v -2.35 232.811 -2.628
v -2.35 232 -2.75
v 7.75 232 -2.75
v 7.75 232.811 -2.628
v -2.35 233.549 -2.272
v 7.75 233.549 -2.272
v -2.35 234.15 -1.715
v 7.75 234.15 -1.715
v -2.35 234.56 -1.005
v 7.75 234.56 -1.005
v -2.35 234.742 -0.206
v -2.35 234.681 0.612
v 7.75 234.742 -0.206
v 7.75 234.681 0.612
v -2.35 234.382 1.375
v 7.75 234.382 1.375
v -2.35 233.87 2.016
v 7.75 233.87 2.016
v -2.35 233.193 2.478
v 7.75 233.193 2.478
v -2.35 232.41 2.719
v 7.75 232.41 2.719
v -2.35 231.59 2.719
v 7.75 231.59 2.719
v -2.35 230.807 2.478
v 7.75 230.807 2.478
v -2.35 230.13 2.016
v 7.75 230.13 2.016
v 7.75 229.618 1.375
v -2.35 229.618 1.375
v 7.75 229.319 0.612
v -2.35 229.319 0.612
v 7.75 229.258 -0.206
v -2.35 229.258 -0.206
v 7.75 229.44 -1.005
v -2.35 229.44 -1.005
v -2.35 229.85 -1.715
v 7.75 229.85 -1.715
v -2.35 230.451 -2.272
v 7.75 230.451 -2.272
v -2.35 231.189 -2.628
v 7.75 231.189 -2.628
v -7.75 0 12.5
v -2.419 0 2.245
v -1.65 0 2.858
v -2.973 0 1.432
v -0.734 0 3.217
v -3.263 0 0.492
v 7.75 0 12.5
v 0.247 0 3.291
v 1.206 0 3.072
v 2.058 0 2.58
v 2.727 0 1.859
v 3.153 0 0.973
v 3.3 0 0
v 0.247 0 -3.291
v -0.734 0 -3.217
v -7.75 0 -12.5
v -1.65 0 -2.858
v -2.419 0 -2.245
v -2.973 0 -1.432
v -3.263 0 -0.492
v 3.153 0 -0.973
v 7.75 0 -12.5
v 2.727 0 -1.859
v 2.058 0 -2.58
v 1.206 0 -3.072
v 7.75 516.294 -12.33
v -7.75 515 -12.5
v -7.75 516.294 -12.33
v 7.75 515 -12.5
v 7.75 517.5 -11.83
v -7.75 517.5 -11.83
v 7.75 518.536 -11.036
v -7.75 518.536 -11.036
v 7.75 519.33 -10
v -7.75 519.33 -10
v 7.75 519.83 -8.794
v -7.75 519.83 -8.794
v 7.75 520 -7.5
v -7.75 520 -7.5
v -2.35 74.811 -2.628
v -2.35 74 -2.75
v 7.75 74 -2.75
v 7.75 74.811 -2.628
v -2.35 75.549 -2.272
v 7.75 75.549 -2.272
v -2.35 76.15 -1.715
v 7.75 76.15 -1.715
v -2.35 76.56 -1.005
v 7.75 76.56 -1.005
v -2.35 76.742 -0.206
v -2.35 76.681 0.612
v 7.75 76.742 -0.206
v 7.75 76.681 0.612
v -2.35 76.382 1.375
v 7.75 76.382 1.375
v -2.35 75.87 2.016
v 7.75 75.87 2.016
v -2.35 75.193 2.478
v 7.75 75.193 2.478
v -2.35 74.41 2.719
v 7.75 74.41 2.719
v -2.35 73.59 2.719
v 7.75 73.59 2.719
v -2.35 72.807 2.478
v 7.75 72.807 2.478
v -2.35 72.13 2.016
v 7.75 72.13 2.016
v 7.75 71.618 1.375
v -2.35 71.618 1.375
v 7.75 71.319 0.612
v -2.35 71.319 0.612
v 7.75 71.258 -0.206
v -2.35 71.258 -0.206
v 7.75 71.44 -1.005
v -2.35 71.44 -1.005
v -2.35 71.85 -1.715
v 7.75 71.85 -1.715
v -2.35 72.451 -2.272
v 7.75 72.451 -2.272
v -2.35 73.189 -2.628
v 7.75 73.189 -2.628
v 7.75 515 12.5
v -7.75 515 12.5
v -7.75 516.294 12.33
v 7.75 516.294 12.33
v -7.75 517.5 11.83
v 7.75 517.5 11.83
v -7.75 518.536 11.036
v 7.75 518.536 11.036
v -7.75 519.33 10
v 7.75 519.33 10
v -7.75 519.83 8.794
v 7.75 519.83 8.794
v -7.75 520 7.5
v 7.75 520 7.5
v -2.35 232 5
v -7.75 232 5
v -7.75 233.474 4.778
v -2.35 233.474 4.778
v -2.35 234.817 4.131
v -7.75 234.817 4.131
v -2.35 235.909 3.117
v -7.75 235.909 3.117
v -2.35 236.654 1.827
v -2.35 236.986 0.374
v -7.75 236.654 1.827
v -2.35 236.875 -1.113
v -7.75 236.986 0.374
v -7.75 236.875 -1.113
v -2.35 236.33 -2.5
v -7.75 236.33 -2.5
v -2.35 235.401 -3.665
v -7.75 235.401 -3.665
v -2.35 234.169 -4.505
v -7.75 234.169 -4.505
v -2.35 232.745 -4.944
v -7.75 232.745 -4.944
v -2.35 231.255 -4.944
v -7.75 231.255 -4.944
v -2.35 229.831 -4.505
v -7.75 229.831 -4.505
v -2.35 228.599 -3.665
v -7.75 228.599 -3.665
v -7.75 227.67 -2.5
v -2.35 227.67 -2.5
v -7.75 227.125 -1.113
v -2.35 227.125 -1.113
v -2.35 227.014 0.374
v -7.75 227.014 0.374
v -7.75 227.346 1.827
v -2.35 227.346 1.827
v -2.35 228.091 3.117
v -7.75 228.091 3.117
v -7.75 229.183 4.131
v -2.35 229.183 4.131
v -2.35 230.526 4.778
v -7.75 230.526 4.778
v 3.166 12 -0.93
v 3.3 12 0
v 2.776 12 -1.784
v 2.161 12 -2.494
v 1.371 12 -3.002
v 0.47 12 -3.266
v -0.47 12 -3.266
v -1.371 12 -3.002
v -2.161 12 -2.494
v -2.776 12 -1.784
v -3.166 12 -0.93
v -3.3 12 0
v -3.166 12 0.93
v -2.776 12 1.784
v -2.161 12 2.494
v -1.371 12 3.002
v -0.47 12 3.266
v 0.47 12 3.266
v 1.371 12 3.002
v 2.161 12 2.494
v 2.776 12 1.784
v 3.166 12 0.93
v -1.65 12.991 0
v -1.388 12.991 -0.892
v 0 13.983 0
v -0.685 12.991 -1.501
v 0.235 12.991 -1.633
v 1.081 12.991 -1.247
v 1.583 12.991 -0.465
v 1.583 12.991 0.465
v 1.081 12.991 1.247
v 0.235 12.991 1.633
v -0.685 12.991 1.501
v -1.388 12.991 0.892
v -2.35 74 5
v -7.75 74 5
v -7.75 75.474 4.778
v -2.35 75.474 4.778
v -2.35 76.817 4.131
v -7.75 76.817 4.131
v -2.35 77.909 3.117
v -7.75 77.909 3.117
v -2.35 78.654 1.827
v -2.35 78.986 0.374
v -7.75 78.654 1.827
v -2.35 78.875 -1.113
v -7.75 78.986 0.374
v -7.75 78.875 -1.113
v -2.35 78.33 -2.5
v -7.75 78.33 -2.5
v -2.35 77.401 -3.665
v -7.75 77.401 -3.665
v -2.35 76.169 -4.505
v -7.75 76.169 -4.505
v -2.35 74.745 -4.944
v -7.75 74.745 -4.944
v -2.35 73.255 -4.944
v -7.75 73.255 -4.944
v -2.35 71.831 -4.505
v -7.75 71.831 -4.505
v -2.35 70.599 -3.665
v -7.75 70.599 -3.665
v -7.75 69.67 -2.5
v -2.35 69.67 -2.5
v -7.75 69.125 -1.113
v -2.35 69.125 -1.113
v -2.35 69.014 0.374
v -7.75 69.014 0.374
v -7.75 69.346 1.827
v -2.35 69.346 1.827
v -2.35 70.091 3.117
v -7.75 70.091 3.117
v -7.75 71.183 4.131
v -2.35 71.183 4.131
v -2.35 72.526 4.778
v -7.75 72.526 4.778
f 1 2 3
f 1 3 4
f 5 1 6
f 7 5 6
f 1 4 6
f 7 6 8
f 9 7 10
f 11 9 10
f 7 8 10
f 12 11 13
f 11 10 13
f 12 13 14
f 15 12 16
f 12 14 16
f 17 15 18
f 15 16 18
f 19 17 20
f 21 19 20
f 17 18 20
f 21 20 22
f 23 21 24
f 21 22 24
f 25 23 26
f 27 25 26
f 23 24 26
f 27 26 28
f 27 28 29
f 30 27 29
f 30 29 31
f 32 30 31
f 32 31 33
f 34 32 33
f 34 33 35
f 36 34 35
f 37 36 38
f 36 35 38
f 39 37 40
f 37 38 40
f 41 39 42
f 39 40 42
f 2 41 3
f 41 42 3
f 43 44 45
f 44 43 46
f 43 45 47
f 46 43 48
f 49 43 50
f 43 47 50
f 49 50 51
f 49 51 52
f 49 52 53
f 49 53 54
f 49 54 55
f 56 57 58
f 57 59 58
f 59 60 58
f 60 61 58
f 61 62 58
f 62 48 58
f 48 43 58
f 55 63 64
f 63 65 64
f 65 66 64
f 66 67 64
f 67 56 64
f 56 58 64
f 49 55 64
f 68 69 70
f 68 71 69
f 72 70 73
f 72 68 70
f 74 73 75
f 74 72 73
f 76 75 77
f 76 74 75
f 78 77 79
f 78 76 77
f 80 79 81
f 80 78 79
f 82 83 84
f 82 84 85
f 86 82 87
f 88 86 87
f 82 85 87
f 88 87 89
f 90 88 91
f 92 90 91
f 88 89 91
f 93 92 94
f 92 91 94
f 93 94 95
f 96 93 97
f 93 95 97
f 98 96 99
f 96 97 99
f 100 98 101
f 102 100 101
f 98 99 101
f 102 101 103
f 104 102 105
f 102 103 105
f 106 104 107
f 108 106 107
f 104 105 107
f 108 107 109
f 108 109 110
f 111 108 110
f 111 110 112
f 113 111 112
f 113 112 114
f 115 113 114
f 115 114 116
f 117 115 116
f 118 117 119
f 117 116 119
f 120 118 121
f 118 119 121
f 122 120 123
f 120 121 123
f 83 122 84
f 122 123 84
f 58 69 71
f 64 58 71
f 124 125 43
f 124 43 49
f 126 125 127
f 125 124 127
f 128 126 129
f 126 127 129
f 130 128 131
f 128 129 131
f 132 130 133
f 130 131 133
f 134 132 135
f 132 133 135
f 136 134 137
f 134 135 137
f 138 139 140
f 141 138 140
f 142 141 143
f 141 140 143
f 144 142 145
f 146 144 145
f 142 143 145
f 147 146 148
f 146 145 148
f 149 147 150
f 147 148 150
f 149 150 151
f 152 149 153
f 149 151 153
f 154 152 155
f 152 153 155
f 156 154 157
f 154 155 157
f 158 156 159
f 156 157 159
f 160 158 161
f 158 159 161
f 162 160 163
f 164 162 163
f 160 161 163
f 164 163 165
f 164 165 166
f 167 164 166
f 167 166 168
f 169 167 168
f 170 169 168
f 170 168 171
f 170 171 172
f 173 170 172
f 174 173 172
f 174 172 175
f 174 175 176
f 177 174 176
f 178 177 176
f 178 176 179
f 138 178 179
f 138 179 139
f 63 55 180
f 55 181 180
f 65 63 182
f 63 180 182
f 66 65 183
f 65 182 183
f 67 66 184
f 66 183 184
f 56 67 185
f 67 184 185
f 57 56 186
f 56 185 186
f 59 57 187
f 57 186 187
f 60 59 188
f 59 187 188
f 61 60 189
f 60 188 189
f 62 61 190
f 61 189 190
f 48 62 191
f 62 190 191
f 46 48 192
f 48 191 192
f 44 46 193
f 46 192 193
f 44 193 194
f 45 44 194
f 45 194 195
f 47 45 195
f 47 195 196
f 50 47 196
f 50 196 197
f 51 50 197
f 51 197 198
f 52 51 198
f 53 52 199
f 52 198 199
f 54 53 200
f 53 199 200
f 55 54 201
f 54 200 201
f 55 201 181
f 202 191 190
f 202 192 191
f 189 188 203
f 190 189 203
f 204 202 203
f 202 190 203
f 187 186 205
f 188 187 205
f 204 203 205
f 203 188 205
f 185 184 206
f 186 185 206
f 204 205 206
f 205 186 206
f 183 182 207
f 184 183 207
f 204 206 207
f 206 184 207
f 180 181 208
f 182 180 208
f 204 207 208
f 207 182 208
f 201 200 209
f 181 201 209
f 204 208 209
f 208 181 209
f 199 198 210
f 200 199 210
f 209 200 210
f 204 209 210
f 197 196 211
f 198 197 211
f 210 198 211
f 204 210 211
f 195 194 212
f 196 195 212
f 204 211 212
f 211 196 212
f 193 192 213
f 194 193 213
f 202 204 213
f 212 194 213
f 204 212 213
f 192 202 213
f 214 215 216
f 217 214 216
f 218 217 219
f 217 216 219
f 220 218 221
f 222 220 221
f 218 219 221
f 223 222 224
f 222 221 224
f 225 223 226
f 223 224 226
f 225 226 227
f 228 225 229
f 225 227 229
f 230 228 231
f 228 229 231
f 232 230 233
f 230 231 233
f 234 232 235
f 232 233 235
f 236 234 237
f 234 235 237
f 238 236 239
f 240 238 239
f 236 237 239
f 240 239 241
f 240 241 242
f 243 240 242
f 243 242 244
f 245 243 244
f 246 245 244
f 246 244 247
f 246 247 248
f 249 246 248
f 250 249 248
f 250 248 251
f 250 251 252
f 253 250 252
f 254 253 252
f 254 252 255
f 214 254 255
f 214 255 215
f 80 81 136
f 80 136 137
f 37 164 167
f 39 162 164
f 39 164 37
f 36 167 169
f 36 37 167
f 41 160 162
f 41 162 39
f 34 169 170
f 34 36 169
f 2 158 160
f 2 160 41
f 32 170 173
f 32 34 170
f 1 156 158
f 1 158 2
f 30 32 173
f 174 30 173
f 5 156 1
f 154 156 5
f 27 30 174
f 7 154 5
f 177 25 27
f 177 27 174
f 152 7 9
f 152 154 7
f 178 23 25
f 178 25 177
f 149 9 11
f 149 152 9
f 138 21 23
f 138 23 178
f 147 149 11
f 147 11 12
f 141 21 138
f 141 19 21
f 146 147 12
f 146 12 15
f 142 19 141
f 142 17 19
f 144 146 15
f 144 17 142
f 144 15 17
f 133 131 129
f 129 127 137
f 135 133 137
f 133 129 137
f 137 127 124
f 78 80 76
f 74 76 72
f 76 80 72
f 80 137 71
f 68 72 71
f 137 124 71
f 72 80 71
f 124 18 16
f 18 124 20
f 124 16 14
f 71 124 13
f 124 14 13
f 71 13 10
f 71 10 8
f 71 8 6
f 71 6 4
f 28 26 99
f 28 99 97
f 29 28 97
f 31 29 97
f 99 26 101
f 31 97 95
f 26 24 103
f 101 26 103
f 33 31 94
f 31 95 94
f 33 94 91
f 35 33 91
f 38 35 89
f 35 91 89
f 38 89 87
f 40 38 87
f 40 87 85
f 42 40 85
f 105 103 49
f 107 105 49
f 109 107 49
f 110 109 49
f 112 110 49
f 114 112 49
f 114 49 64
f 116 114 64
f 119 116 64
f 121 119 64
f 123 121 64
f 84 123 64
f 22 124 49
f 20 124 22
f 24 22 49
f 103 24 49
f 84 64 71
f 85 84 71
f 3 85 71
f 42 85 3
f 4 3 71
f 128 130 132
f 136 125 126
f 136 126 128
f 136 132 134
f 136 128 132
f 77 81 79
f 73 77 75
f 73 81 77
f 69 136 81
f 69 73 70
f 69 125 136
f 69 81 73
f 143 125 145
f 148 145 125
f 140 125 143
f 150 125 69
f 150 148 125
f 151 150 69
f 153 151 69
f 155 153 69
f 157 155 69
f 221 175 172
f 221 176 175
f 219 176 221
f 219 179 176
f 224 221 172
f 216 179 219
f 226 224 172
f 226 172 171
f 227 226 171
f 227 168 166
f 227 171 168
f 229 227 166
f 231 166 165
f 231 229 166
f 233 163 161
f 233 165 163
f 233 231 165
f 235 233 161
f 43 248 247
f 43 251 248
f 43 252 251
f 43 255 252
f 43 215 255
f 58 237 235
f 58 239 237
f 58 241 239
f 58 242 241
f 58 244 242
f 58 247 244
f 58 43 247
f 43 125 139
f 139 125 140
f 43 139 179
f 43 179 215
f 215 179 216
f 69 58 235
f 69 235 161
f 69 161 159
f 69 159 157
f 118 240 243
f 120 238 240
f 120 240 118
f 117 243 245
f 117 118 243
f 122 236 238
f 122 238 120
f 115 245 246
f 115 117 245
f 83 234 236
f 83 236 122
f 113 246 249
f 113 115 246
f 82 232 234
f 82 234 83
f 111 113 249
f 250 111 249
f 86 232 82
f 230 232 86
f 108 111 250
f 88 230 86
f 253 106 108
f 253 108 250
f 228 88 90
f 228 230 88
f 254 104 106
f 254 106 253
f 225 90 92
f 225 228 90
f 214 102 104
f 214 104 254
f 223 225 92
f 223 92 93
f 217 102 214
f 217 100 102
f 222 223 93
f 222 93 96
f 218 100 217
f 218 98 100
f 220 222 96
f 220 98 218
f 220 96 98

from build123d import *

# Parameters (mm, degrees)
SKETCH1_W                                           = 15.5
SKETCH1_H                                           = 25
BOSS_EXTRUDE1_DEPTH                                 = 520
FILLET1_R                                           = 5
F_5_0MM_DOWEL_HOLE1_D                               = 6.6
F_5_0MM_DOWEL_HOLE1_DEPTH                           = 12
F_5_0MM_DOWEL_HOLE1_TIP                             = 1.982840043
CBORE_FOR_M5_HEX_SOCKET_HEAD_CAP_SCREW2_D           = 5.5
CBORE_FOR_M5_HEX_SOCKET_HEAD_CAP_SCREW2_CBORE_D     = 10
CBORE_FOR_M5_HEX_SOCKET_HEAD_CAP_SCREW2_CBORE_DEPTH = 5.4


with BuildPart() as part:
    # Sketch1 → Boss-Extrude1 (new body)
    with BuildSketch(Plane(origin=(0, 0, 0), x_dir=(1, 0, 0), z_dir=(0, 1, 0))):
        Rectangle(SKETCH1_W, SKETCH1_H)
    extrude(amount=BOSS_EXTRUDE1_DEPTH)

    # Fillet1
    fillet1_edges = [part.edges().sort_by_distance(p)[0] for p in [
        (0, 520, -12.5),
        (0, 520, 12.5),
    ]]
    fillet(fillet1_edges, radius=FILLET1_R)

    # Ø5.0mm Dowel Hole1
    with Locations(Plane(origin=(0, 0, 0), x_dir=(-1, 0, 0), z_dir=(0, -1, 0))):
        with Locations((0, 0)):
            Hole(F_5_0MM_DOWEL_HOLE1_D / 2, depth=F_5_0MM_DOWEL_HOLE1_DEPTH)
            with Locations((0, 0, -(F_5_0MM_DOWEL_HOLE1_DEPTH + F_5_0MM_DOWEL_HOLE1_TIP / 2))):  # 118° drill point
                Cone(0, F_5_0MM_DOWEL_HOLE1_D / 2, F_5_0MM_DOWEL_HOLE1_TIP, mode=Mode.SUBTRACT)

    # CBORE for M5 Hex Socket Head Cap Screw2 (through all)
    with Locations(Plane.ZY.offset(7.75)):
        with Locations((0, 74), (0, 232)):
            CounterBoreHole(CBORE_FOR_M5_HEX_SOCKET_HEAD_CAP_SCREW2_D / 2, CBORE_FOR_M5_HEX_SOCKET_HEAD_CAP_SCREW2_CBORE_D / 2, CBORE_FOR_M5_HEX_SOCKET_HEAD_CAP_SCREW2_CBORE_DEPTH)


solid = part.part
